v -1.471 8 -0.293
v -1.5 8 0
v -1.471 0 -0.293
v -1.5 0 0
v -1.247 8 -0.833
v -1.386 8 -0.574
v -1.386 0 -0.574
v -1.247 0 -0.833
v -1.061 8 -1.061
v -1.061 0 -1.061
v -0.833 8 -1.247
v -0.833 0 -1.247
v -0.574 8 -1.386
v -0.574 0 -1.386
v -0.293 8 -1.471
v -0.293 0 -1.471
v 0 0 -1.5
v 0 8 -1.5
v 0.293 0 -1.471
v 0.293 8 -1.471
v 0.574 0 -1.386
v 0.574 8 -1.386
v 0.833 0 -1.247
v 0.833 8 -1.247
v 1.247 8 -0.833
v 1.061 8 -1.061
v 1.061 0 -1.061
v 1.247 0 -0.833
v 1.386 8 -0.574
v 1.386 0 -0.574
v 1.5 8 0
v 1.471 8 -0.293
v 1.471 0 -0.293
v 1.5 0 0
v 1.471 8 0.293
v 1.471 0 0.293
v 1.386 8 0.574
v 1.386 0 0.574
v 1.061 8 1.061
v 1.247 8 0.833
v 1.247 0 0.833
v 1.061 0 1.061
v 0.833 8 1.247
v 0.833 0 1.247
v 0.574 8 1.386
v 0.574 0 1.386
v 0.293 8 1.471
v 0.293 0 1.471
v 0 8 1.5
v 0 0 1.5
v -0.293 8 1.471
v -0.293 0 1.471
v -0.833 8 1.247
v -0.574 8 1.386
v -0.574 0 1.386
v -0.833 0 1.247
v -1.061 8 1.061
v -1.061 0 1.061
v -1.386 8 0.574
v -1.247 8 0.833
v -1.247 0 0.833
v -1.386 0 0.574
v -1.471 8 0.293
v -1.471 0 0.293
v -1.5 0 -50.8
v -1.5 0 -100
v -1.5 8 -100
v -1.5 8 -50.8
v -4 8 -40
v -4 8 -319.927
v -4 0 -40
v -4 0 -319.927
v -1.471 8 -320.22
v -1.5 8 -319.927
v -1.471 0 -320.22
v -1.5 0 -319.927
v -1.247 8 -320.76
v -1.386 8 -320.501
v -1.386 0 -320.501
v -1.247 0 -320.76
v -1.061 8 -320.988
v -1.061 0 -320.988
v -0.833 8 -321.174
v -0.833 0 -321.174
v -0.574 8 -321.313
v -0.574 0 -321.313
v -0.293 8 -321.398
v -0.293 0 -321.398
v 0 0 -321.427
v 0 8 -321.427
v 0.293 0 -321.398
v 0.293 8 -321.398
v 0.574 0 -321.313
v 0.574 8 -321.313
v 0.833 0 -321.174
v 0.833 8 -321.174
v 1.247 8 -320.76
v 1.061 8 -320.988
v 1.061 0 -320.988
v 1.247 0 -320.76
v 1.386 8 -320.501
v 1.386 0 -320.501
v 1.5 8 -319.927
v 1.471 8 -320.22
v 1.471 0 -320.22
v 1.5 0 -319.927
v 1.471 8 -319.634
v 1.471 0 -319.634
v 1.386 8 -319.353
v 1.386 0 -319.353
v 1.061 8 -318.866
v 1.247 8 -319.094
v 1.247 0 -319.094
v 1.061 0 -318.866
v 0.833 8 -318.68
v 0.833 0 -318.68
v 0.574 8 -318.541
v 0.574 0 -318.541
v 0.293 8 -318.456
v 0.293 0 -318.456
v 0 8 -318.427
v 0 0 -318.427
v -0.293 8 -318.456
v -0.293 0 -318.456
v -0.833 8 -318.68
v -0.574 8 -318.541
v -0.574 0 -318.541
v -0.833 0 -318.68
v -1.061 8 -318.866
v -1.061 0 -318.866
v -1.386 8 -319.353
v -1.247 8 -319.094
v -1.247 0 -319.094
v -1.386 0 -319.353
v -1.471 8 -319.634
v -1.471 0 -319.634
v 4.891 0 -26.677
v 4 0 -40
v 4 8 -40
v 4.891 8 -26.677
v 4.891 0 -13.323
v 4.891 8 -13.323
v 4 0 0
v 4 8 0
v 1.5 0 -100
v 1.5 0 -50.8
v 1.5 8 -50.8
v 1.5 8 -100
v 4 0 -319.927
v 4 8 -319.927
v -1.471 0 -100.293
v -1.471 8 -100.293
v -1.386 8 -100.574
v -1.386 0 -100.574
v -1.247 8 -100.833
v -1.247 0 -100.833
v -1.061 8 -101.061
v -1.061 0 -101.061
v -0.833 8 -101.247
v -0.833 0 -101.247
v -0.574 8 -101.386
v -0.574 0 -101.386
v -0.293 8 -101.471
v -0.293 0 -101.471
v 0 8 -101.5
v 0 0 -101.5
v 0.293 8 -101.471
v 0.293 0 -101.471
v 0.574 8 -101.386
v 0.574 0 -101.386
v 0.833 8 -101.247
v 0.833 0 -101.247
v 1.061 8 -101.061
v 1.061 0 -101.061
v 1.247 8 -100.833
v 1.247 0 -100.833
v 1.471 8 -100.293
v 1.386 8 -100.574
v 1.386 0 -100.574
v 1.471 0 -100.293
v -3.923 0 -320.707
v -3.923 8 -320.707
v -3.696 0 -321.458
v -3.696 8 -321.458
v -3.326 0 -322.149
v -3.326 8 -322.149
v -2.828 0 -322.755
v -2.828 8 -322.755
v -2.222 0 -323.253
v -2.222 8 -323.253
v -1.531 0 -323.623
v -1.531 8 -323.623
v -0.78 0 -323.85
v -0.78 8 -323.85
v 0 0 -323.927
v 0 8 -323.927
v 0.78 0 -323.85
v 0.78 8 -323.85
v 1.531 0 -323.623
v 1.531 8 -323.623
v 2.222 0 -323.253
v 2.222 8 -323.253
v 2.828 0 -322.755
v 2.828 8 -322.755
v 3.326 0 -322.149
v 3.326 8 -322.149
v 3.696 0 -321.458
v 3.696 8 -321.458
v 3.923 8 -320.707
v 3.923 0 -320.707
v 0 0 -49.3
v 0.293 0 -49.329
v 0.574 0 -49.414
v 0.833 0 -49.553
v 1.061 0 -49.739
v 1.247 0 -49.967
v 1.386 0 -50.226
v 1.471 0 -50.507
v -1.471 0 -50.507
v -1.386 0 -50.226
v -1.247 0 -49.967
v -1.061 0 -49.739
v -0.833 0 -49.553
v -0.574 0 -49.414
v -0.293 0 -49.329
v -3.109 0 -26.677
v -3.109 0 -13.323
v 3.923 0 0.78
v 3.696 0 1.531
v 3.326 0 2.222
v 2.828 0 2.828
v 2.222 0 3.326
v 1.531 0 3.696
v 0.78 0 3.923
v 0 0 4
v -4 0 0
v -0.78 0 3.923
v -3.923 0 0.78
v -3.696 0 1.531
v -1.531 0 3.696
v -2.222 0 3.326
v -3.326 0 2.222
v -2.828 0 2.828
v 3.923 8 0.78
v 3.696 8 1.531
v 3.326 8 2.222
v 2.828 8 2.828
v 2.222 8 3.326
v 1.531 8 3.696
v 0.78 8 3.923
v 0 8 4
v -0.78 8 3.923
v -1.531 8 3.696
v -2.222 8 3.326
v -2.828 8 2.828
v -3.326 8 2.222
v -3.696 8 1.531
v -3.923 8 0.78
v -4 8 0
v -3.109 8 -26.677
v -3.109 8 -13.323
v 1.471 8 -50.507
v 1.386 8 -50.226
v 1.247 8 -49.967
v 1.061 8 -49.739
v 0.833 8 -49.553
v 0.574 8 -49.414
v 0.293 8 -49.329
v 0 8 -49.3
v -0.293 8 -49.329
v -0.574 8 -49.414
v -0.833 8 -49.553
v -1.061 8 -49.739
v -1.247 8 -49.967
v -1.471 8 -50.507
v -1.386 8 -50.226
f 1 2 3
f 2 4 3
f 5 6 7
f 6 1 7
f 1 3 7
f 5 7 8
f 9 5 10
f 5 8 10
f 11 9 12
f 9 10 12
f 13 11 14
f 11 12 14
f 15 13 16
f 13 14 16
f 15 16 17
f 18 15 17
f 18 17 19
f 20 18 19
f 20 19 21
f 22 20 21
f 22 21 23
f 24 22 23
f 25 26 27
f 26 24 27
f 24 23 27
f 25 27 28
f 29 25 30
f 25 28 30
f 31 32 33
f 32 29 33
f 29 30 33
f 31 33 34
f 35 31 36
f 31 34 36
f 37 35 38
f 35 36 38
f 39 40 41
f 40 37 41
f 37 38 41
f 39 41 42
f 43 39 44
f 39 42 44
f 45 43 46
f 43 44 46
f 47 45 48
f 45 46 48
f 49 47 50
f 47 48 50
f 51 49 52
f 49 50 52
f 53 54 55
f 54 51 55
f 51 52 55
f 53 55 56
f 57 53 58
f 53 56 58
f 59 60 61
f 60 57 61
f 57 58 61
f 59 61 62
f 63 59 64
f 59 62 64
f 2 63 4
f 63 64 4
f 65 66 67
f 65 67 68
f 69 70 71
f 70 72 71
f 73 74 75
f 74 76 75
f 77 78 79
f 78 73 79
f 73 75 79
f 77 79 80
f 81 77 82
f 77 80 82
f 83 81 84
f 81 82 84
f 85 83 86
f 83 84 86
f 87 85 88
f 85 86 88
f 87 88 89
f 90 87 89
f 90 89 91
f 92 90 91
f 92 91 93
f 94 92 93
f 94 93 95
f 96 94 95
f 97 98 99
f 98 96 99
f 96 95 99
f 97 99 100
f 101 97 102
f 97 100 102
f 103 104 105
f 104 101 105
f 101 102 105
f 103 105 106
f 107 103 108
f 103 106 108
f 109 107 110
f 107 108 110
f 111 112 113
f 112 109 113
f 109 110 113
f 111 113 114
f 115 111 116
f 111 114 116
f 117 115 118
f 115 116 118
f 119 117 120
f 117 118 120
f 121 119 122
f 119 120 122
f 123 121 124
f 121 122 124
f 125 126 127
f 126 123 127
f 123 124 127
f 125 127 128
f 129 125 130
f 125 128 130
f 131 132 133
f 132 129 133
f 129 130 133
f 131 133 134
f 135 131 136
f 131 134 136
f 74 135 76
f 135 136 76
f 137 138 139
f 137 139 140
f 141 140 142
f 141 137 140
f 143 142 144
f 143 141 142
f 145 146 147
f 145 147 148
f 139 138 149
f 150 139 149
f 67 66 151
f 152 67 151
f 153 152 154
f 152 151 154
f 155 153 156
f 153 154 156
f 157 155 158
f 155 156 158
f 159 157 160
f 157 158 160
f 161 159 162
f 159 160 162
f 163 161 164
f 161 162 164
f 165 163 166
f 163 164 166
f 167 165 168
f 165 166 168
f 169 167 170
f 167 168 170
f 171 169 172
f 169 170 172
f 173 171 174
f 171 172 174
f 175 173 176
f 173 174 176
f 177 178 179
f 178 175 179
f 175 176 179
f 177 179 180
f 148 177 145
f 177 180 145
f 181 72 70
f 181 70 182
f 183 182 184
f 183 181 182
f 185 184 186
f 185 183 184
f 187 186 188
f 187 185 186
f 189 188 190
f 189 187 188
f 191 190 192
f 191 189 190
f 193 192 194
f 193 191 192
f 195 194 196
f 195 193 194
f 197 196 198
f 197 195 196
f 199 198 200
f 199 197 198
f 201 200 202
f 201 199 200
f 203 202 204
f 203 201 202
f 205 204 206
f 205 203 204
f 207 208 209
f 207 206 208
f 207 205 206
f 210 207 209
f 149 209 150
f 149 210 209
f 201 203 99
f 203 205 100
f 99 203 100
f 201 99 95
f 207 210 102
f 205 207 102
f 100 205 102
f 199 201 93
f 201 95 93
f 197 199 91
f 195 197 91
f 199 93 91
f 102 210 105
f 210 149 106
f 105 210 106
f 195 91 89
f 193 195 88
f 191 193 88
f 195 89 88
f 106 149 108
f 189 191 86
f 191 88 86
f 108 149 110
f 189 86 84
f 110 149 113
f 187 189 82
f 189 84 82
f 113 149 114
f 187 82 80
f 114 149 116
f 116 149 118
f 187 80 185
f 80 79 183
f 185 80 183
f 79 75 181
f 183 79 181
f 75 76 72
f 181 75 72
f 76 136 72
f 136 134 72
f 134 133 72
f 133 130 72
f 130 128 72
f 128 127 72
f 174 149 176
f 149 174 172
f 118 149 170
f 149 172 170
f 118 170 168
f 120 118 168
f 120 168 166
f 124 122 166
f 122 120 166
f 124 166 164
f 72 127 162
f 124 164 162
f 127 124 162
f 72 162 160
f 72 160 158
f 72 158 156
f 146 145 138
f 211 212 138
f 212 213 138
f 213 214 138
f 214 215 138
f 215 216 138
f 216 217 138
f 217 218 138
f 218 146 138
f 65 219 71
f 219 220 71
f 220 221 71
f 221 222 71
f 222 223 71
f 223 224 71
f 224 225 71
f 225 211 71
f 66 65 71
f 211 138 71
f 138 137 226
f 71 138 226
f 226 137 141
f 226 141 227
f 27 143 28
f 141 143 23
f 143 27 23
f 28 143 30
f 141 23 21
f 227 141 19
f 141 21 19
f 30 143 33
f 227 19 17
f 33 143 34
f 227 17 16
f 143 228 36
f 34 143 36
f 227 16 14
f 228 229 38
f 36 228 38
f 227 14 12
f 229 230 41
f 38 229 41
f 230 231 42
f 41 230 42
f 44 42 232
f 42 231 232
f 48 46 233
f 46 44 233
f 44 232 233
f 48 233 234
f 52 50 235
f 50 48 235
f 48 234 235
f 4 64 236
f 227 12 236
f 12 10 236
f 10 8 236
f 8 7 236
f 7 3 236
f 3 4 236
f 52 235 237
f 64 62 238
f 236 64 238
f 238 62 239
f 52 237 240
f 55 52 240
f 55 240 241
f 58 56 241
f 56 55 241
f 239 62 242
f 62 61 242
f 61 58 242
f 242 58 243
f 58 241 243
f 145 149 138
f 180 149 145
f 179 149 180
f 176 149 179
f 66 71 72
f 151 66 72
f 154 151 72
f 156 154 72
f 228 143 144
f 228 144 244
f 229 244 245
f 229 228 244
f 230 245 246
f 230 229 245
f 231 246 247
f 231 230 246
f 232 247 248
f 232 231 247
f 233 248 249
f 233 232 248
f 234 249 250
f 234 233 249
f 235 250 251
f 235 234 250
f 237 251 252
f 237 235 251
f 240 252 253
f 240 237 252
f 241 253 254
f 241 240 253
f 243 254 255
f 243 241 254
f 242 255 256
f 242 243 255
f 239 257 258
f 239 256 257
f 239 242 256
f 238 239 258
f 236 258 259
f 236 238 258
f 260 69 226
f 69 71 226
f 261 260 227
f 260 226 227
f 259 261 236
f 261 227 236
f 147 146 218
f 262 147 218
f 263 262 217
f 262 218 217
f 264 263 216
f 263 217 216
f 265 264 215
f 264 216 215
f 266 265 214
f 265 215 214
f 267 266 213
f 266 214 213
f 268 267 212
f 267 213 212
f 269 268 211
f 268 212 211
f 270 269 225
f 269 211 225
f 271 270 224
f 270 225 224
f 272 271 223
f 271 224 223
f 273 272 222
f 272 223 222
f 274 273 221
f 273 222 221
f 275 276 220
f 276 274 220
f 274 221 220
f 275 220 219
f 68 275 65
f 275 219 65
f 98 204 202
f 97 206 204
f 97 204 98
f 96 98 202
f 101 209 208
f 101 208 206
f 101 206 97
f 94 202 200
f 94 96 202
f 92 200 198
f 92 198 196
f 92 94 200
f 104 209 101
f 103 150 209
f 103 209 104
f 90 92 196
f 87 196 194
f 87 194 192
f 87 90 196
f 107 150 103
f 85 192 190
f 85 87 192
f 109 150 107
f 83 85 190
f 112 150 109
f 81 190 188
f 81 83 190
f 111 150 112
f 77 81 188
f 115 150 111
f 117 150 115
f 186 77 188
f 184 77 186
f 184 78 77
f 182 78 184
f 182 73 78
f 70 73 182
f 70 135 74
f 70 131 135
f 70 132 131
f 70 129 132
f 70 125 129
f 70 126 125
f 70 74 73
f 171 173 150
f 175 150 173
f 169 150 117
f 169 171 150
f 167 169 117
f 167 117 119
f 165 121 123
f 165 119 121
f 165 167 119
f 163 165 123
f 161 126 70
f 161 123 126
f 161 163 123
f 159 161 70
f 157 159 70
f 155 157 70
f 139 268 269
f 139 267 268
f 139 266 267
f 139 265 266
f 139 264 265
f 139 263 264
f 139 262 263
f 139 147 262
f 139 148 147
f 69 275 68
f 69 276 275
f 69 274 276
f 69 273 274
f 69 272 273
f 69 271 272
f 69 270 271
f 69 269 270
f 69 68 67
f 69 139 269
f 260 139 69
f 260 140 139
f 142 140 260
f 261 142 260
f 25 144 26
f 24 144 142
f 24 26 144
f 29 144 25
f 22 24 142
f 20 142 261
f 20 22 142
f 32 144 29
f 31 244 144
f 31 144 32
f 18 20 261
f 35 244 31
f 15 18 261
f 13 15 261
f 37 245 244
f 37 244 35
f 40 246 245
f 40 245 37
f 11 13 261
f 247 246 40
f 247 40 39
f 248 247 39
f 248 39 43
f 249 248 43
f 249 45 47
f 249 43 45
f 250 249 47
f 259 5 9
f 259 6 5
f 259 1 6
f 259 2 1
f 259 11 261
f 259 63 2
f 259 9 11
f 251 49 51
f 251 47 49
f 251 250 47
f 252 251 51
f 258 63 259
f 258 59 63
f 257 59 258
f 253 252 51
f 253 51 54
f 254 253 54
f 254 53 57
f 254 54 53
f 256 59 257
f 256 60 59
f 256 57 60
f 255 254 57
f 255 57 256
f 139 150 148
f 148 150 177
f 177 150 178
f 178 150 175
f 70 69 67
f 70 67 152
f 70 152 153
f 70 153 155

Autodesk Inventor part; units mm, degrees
ref_plane "XZ Plane" through (0, 0, 0) normal (0, 1, 0) x (-1, 0, 0)
ref_plane "XY Plane" through (0, 0, 0) normal (0, 0, 1) x (1, 0, 0)
sketch "Sketch1" plane through (0, 0, 0) normal (0, 1, 0) x (-1, 0, 0)
  line L0 (0, 0) -> (0, -319.927) construction
  line L1 (-4, 0) -> (-4, -319.927)
  line L2 (4, -319.927) -> (4, 0)
  arc A0 (4, 0) -> (-4, 0) centre (0, 0) ccw
  arc A1 (-4, -319.927) -> (4, -319.927) centre (0, -319.927) ccw
  circle A2 centre (0, 0) radius 1.5
  circle A3 centre (0, -319.927) radius 1.5
  line L3 (0, -50.8) -> (0, -100) construction
  line L4 (-1.5, -50.8) -> (-1.5, -100)
  line L5 (1.5, -100) -> (1.5, -50.8)
  arc A4 (1.5, -50.8) -> (-1.5, -50.8) centre (0, -50.8) ccw
  arc A5 (-1.5, -100) -> (1.5, -100) centre (0, -100) ccw
  arc A6 (4, 0) -> (4, -40) centre (202.9975, -20) ccw
  arc A7 (-4, 0) -> (-4, -40) centre (194.9975, -20) ccw
  point P0 (0, -159.9635)
  point P1 (0, -75.4)
  dimension "d0" = 319.927
  dimension "d1" = 8
  dimension "d2" = 3
  dimension "d3" = 3
  dimension "d12" = 3
  dimension "d13" = 50.8
  dimension "d14" = 100
  dimension "d15" = 40
  dimension "d16" = 200
  dimension "d17" = 200
extrude "Extrusion1" add sketch "Sketch1" along normal blind 8 contours A0 A6 L2 A1 L1 | L1 A7
sketch "Sketch2" plane through (0, 0, 0) normal (0, -1, 0) x (1, 0, 0)
  arc A0 (4, -40) -> (4, 0) centre (-194.9975, -20) ccw projected
  arc A1 (4, 0) -> (-4, 0) centre (0, 0) ccw projected
  arc A2 (-4, -40) -> (-4, 0) centre (-202.9975, -20) ccw projected
  line L0 (-4, -319.927) -> (-4, -40) projected
  arc A3 (-4, -319.927) -> (4, -319.927) centre (0, -319.927) ccw projected
  line L1 (4, -40) -> (4, -319.927) projected
  circle A4 centre (0, 0) radius 1.5 projected
  circle A5 centre (0, -319.927) radius 1.5 projected
  arc A6 (1.5, -50.8) -> (-1.5, -50.8) centre (0, -50.8) ccw projected
  line L2 (1.5, -100) -> (1.5, -50.8) projected
  arc A7 (-1.5, -100) -> (1.5, -100) centre (0, -100) ccw projected
  line L3 (-1.5, -50.8) -> (-1.5, -100) projected
